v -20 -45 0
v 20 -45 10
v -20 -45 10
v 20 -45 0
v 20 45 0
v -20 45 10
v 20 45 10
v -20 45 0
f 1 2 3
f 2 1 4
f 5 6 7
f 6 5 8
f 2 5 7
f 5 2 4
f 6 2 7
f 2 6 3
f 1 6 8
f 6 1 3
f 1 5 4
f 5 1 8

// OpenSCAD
//
//	Parametric Monolith
//	By Theron Trowbridge
//	2011-01-11
//	theron.trowbridge@gmail.com
//	
//	Modeled after Tycho Magnetic Anomoly monoliths from the 2001: A Space Odyssey series
//	Automatic adjustment to be centered on build platform for MakerBot 3D printer
//

/////////////////////
//	Parameters	//
////////////////////
ratio = [ 1, 2, 3 ];	//	The first three primes - change for other shapes
scale_factor = 10;		//	10 is about largest for MakerBot, reduce to make smaller

/////////////////////
//	monolith()	//
////////////////////
module monolith()
{
	x = pow( ratio[0], 2 );
	y = pow( ratio[1], 2 );
	z = pow( ratio[2], 2 );

	cube([x,y,z]);
}

//	Render the monolith
rotate( a=90, v=[1,0,0] ) {	//	Rotate 90 degrees on X axis (lay it flat
	rotate( a=90, v=[0,0,1] ) {	//	Rotate 90 degrees on Z axis (make it face us)
		translate( v=[ 0,
					pow( ratio[1], 2) / 2 * scale_factor * -1,
					pow( ratio[2], 2) / 2 * scale_factor * -1 ] ) {	//	Move it to be on Y and Z axis
			scale( v=[ scale_factor, scale_factor, scale_factor ] ) {	//	Scale it to desired size
				monolith();
			}
		}
	}
}
